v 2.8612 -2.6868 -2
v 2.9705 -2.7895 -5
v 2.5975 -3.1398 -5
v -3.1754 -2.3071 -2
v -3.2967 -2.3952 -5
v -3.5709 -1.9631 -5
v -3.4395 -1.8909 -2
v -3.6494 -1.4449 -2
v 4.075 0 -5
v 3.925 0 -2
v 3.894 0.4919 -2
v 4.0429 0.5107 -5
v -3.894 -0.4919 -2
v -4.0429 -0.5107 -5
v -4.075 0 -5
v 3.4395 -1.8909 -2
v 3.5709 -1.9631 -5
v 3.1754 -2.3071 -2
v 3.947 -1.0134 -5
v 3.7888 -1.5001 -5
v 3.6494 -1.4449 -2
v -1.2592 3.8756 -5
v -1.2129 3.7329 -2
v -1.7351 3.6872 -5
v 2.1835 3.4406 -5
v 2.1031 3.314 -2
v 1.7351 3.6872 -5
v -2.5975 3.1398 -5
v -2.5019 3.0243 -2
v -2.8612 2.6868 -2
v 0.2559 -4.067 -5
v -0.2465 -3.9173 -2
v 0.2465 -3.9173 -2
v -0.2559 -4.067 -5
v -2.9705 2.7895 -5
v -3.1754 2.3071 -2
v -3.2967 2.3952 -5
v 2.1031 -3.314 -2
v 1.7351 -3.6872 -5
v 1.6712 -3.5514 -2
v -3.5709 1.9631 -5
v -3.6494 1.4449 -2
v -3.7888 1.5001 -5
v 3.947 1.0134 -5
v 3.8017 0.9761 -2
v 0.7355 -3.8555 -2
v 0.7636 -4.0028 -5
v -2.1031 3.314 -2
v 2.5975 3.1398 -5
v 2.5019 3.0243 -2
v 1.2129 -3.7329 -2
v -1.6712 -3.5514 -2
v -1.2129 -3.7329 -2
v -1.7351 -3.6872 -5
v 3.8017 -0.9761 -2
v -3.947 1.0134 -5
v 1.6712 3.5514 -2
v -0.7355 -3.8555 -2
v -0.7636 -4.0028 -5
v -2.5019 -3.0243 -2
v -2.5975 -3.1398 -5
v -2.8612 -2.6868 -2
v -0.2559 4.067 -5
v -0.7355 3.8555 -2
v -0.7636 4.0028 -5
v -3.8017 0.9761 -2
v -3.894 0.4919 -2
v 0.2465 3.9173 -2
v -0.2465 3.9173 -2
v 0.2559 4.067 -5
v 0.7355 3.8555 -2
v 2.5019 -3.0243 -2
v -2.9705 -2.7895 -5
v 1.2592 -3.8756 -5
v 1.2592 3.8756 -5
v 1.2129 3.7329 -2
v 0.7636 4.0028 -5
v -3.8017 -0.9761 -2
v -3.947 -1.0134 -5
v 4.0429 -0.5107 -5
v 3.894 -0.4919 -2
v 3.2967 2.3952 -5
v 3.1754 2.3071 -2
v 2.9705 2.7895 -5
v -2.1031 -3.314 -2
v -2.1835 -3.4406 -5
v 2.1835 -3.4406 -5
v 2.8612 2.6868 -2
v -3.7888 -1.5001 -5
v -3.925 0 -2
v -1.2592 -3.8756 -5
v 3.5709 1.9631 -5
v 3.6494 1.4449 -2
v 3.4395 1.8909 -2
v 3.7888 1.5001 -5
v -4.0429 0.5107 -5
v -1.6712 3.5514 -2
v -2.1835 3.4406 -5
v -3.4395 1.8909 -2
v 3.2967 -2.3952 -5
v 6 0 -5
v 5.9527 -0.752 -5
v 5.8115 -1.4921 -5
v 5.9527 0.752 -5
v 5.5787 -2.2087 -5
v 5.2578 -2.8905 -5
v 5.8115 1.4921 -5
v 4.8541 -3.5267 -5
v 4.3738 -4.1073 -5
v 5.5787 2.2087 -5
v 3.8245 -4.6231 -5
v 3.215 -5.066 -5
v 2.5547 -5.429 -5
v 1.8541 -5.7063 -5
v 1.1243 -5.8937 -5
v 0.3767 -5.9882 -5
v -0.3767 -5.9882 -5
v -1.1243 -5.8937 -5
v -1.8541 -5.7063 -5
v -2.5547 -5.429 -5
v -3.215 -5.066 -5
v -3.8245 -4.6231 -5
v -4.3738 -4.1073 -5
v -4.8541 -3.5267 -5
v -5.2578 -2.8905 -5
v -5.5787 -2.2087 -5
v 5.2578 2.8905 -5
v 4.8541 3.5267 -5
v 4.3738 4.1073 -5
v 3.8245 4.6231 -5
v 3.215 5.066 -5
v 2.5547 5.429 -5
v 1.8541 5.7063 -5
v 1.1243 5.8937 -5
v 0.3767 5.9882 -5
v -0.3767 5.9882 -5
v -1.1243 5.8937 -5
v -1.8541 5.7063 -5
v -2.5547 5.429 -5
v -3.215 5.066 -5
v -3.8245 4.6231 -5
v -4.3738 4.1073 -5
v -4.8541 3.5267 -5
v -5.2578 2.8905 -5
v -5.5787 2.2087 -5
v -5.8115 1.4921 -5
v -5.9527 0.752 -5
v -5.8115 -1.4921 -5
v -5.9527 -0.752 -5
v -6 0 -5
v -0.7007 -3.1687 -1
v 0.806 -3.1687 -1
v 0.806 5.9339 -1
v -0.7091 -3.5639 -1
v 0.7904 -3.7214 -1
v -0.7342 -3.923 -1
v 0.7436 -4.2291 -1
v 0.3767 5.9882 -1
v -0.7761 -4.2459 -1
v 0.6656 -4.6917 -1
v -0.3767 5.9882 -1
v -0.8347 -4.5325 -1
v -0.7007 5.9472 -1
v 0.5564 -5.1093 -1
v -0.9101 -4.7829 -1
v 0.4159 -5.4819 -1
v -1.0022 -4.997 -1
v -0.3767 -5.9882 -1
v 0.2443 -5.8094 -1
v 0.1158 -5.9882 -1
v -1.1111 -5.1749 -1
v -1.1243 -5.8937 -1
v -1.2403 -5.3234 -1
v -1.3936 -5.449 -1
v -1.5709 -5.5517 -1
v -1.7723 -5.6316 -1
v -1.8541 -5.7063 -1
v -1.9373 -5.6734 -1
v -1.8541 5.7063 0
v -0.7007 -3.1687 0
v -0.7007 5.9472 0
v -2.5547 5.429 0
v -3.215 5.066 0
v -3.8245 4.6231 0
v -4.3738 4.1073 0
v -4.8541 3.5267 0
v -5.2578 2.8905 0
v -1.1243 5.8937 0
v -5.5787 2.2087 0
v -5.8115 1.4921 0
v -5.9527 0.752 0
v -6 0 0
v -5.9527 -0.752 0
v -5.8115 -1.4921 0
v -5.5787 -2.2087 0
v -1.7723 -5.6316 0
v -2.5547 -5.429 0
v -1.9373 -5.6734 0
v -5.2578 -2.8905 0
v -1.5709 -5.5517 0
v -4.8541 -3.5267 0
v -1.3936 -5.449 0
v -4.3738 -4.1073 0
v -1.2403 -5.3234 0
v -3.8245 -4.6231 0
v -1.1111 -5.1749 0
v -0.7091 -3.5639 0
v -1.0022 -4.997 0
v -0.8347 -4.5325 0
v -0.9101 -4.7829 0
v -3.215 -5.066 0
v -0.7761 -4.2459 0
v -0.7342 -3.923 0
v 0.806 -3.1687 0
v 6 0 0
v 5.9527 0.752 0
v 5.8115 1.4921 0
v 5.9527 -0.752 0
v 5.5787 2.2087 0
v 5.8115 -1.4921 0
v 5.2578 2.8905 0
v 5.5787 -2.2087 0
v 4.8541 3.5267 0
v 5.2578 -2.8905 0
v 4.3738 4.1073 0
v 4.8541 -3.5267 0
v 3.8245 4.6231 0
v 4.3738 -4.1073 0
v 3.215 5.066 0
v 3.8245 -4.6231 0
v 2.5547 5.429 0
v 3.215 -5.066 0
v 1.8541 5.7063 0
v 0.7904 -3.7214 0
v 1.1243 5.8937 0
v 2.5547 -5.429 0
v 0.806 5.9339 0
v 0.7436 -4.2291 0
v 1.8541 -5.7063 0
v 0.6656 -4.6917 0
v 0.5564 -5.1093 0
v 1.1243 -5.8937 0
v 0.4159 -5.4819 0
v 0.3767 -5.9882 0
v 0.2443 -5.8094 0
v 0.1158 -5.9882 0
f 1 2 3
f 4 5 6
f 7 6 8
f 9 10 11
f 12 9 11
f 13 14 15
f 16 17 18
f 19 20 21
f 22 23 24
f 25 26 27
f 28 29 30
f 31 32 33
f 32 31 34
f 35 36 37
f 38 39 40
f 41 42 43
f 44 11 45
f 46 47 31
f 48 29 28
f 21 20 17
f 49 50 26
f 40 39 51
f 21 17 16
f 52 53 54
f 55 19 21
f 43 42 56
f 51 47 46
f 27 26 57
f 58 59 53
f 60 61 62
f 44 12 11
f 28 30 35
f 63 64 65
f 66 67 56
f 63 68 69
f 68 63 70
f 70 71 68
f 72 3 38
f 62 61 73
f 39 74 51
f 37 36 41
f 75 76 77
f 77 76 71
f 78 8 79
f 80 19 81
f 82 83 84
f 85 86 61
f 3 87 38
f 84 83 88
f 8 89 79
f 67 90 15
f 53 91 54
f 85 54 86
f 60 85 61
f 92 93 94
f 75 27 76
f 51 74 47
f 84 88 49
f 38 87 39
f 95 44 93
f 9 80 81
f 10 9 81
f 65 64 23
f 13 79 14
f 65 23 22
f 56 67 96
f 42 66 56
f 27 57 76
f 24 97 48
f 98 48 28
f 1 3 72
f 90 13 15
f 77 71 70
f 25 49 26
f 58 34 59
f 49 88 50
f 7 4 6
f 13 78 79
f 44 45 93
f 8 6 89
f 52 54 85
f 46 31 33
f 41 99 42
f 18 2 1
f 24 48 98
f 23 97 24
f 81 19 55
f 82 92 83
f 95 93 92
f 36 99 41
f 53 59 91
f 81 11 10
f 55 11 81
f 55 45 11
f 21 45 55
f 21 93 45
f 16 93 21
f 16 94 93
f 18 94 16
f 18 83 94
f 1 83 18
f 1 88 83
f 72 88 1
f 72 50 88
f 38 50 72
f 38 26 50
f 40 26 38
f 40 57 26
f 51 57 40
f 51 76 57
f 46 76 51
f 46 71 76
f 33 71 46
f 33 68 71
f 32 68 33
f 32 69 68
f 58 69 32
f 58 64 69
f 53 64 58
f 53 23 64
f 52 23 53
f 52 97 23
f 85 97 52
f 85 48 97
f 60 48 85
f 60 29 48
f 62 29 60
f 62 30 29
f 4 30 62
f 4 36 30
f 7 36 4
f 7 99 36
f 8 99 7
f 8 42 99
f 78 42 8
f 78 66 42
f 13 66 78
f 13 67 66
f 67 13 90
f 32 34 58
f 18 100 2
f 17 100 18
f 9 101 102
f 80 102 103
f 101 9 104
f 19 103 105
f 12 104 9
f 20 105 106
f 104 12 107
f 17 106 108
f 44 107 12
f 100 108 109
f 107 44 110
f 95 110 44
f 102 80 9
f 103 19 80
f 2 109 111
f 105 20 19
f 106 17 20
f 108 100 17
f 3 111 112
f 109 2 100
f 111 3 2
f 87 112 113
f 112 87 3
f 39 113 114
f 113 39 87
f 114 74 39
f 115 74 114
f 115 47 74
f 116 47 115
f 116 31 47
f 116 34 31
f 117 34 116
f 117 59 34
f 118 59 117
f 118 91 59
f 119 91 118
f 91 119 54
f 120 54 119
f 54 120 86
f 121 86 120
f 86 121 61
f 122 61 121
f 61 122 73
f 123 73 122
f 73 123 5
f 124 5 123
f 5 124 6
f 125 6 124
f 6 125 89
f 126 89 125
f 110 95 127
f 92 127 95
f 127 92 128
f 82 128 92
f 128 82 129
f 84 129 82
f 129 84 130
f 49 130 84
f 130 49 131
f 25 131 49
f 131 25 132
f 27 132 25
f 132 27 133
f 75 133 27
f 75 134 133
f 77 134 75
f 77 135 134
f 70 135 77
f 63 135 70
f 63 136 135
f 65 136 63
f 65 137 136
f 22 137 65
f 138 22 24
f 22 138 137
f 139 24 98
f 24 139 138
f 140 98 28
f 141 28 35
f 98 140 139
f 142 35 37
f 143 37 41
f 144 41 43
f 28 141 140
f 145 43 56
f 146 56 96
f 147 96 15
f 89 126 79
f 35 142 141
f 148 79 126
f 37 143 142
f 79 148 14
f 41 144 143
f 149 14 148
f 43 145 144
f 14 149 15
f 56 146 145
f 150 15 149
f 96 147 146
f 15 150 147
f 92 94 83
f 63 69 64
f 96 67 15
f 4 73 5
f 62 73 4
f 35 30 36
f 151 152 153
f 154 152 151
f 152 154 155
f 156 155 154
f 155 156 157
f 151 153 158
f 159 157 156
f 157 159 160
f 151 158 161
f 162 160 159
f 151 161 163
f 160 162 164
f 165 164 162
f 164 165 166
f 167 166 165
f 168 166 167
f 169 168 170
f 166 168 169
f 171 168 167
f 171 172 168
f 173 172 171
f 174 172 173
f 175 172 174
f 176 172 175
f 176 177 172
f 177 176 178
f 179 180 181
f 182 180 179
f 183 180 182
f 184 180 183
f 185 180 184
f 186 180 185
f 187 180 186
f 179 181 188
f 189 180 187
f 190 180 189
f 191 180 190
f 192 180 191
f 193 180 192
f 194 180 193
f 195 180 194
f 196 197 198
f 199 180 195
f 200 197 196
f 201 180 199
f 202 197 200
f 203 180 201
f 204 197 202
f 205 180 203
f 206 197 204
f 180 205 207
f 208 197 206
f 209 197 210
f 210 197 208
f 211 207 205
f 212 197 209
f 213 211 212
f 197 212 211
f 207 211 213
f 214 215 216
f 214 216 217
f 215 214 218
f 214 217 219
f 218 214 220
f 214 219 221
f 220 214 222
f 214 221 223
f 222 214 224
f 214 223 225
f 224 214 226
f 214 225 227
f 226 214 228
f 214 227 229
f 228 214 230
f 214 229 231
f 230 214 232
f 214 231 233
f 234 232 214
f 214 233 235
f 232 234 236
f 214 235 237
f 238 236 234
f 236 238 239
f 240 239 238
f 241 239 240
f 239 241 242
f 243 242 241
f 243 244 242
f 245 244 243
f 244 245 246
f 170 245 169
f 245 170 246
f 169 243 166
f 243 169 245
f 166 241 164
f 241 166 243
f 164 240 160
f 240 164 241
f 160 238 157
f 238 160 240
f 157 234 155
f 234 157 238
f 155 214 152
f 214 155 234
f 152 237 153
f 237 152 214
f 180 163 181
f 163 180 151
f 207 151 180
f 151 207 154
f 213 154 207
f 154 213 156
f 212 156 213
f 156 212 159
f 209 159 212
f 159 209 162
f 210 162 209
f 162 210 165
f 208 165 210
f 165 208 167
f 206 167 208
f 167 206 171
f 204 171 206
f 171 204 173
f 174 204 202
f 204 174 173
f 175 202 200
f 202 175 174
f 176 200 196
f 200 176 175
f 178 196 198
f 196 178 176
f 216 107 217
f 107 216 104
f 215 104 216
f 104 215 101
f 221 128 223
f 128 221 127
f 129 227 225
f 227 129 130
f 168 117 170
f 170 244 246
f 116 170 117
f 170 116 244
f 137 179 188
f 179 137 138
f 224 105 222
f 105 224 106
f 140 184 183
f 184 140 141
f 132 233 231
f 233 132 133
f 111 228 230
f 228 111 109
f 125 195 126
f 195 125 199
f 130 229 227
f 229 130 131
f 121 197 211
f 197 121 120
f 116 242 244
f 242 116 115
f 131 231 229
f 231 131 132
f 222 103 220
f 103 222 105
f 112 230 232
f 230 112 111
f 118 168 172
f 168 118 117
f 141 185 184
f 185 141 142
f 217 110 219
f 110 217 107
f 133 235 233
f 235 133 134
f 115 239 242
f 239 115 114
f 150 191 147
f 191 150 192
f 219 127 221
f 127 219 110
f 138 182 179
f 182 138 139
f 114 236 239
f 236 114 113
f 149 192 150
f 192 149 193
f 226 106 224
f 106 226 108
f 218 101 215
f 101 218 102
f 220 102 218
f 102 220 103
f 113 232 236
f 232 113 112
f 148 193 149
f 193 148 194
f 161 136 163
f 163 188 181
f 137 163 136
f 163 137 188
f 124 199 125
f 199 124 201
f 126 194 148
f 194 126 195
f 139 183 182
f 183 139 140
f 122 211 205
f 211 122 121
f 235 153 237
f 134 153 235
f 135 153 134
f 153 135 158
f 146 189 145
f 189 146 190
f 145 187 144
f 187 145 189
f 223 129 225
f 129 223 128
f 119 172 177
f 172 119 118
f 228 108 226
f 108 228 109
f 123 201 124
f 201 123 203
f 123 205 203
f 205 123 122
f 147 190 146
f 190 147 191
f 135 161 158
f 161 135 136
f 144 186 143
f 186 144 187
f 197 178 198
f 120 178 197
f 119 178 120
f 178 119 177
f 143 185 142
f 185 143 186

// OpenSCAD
$fn = 50;

difference() {
	union() {
		translate(v = [0, 0, -5.0]) {
			cylinder(h = 5, r = 6.0);
		}
	}
	union() {
		#translate(v = [0, 0, -5.0]) {
			cylinder(h = 3, r1 = 4.075, r2 = 3.925);
		}
		translate(v = [0, 0, -1]) {
			linear_extrude(height = 1) {
				text(font = "Wingdings", halign = "center", size = 11, text = "J", valign = "center");
			}
		}
	}
}
